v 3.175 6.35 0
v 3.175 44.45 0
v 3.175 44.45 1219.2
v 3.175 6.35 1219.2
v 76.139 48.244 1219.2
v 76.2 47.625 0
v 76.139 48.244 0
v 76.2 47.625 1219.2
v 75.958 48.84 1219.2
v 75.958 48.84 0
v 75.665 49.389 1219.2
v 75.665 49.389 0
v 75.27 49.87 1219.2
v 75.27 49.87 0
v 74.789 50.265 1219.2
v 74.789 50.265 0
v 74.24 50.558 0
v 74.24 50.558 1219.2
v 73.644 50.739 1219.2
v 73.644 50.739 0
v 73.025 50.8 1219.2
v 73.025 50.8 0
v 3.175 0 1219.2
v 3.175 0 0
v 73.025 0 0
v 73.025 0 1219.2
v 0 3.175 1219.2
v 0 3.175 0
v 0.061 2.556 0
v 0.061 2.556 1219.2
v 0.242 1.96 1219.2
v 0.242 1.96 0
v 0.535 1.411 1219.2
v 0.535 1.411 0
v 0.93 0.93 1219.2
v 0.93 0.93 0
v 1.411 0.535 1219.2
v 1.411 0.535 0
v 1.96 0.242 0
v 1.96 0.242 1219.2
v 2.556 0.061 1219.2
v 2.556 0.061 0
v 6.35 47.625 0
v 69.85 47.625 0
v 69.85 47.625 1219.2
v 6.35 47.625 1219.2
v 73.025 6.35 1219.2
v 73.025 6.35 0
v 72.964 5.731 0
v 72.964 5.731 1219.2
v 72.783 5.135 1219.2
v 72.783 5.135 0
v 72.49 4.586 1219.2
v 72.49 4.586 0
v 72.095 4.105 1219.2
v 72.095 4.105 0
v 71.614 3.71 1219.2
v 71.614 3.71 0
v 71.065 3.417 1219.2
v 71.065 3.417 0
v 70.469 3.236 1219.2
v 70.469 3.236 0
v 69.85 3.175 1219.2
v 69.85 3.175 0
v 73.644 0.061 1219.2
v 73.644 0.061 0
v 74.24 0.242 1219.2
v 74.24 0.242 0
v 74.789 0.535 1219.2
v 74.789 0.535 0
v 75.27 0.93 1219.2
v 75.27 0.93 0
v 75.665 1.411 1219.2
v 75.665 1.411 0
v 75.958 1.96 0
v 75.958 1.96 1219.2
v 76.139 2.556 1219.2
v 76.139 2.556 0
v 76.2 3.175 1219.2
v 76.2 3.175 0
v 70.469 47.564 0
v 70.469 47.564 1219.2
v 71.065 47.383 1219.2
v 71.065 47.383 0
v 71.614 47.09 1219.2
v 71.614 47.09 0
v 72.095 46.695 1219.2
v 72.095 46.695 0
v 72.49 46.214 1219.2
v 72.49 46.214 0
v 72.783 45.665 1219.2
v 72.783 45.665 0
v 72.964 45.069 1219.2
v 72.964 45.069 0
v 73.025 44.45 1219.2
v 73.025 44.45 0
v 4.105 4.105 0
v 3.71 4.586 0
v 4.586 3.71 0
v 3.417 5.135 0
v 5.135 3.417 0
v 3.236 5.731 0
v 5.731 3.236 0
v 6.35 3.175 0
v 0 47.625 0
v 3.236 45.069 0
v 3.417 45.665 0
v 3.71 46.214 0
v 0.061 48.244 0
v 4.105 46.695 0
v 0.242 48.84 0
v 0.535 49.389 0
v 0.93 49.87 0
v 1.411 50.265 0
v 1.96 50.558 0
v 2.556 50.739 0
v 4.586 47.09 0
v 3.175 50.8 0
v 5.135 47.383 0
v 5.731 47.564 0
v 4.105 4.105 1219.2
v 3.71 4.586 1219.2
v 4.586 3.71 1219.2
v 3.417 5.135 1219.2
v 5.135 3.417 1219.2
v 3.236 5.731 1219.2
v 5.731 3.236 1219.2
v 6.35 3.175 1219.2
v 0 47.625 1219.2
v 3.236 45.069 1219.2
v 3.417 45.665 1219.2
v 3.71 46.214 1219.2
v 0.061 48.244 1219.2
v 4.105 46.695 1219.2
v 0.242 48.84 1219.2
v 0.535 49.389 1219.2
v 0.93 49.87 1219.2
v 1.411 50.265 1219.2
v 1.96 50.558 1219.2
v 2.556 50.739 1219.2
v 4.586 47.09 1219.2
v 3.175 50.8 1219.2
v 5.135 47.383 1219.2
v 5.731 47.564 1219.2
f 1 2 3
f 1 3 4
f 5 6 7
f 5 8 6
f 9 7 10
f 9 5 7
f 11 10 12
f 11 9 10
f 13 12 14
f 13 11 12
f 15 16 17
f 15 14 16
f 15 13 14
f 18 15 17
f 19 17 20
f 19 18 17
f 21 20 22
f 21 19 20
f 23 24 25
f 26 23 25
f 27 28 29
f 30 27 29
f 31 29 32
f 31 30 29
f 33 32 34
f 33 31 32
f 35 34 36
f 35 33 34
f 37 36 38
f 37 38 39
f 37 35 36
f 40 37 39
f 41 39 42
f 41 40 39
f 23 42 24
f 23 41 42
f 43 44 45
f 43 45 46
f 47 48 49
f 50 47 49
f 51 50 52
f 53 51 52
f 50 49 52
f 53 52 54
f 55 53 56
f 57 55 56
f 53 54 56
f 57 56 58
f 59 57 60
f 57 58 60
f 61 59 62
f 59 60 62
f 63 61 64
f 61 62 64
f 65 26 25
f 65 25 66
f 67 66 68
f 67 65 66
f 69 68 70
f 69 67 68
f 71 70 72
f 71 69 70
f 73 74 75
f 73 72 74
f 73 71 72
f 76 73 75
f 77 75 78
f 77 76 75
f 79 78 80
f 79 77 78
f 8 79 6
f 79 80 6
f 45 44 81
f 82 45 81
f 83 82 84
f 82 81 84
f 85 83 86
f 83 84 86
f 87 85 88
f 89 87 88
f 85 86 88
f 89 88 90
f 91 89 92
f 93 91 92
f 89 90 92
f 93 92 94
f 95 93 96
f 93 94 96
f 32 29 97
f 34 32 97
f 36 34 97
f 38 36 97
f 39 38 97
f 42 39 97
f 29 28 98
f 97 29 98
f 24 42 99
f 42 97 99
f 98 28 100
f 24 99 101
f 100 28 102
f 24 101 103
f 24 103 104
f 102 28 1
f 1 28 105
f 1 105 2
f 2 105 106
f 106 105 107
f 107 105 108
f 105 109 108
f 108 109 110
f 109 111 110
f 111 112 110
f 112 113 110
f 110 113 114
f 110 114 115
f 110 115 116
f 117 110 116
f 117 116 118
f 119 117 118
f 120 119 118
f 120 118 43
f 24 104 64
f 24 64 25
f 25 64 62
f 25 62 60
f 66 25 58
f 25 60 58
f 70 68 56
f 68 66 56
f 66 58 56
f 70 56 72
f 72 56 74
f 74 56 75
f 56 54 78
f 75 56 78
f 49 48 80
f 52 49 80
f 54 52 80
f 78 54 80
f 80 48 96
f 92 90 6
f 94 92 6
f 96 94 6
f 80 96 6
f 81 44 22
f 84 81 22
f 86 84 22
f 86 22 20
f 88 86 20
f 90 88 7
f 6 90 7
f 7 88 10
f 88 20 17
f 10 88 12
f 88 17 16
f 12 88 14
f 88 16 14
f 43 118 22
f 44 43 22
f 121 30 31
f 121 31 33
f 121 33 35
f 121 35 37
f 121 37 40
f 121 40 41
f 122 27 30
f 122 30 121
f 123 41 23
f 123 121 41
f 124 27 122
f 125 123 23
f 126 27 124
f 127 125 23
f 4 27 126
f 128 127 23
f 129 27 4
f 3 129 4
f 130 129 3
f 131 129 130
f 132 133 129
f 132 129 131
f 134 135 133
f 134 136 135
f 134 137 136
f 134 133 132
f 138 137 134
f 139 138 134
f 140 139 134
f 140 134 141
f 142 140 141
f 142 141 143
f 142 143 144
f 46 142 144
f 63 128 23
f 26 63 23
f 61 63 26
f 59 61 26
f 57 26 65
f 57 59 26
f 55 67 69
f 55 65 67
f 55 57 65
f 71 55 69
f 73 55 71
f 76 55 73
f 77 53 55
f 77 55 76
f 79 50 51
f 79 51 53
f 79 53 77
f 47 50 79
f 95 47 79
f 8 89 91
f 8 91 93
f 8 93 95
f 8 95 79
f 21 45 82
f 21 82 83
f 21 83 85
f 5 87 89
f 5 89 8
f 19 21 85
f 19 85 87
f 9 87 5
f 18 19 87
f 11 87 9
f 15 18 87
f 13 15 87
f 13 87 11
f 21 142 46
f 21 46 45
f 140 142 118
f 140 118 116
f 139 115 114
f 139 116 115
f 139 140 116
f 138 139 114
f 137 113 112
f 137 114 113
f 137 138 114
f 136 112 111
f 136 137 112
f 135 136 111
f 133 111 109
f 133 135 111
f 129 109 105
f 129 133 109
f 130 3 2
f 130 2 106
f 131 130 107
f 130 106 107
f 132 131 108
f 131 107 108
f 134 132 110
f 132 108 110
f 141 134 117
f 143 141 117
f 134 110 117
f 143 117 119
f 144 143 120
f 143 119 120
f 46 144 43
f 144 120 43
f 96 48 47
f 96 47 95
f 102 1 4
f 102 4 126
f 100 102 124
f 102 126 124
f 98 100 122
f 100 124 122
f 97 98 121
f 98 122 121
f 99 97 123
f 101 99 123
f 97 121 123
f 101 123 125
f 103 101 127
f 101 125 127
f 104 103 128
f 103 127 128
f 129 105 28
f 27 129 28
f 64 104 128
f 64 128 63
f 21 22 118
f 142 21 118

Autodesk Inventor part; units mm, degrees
ref_plane "YZ Plane" through (0, 0, 0) normal (1, 0, 0) x (0, 1, 0)
ref_plane "XZ Plane" through (0, 0, 0) normal (0, 1, 0) x (-1, 0, 0)
ref_plane "XY Plane" through (0, 0, 0) normal (0, 0, 1) x (1, 0, 0)
sketch "Sketch1" plane through (0, 0, 0) normal (0, 0, 1) x (1, 0, 0)
  line L0 (0, 0) -> (76.2, 0)
  line L1 (76.2, 0) -> (76.2, 50.8)
  line L2 (76.2, 50.8) -> (0, 50.8)
  line L3 (0, 50.8) -> (0, 0)
  dimension "d0" = 76.2
  dimension "d1" = 50.8
extrude "Extrusion1" add sketch "Sketch1" along normal blind 1219.2
shell "Shell1" thickness 3.175 removed faces 2 at (50.8, 16.9333, 0) at (50.8, 16.9333, 1219.2)
fillet "Fillet1" radius 3.175 8 edges at (0, 50.8, 609.6) (3.175, 3.175, 609.6) (73.025, 3.175, 609.6) (3.175, 47.625, 609.6) (73.025, 47.625, 609.6) (76.2, 50.8, 609.6) (0, 0, 609.6) (76.2, 0, 609.6)
properties part number "2x3_Tube"
